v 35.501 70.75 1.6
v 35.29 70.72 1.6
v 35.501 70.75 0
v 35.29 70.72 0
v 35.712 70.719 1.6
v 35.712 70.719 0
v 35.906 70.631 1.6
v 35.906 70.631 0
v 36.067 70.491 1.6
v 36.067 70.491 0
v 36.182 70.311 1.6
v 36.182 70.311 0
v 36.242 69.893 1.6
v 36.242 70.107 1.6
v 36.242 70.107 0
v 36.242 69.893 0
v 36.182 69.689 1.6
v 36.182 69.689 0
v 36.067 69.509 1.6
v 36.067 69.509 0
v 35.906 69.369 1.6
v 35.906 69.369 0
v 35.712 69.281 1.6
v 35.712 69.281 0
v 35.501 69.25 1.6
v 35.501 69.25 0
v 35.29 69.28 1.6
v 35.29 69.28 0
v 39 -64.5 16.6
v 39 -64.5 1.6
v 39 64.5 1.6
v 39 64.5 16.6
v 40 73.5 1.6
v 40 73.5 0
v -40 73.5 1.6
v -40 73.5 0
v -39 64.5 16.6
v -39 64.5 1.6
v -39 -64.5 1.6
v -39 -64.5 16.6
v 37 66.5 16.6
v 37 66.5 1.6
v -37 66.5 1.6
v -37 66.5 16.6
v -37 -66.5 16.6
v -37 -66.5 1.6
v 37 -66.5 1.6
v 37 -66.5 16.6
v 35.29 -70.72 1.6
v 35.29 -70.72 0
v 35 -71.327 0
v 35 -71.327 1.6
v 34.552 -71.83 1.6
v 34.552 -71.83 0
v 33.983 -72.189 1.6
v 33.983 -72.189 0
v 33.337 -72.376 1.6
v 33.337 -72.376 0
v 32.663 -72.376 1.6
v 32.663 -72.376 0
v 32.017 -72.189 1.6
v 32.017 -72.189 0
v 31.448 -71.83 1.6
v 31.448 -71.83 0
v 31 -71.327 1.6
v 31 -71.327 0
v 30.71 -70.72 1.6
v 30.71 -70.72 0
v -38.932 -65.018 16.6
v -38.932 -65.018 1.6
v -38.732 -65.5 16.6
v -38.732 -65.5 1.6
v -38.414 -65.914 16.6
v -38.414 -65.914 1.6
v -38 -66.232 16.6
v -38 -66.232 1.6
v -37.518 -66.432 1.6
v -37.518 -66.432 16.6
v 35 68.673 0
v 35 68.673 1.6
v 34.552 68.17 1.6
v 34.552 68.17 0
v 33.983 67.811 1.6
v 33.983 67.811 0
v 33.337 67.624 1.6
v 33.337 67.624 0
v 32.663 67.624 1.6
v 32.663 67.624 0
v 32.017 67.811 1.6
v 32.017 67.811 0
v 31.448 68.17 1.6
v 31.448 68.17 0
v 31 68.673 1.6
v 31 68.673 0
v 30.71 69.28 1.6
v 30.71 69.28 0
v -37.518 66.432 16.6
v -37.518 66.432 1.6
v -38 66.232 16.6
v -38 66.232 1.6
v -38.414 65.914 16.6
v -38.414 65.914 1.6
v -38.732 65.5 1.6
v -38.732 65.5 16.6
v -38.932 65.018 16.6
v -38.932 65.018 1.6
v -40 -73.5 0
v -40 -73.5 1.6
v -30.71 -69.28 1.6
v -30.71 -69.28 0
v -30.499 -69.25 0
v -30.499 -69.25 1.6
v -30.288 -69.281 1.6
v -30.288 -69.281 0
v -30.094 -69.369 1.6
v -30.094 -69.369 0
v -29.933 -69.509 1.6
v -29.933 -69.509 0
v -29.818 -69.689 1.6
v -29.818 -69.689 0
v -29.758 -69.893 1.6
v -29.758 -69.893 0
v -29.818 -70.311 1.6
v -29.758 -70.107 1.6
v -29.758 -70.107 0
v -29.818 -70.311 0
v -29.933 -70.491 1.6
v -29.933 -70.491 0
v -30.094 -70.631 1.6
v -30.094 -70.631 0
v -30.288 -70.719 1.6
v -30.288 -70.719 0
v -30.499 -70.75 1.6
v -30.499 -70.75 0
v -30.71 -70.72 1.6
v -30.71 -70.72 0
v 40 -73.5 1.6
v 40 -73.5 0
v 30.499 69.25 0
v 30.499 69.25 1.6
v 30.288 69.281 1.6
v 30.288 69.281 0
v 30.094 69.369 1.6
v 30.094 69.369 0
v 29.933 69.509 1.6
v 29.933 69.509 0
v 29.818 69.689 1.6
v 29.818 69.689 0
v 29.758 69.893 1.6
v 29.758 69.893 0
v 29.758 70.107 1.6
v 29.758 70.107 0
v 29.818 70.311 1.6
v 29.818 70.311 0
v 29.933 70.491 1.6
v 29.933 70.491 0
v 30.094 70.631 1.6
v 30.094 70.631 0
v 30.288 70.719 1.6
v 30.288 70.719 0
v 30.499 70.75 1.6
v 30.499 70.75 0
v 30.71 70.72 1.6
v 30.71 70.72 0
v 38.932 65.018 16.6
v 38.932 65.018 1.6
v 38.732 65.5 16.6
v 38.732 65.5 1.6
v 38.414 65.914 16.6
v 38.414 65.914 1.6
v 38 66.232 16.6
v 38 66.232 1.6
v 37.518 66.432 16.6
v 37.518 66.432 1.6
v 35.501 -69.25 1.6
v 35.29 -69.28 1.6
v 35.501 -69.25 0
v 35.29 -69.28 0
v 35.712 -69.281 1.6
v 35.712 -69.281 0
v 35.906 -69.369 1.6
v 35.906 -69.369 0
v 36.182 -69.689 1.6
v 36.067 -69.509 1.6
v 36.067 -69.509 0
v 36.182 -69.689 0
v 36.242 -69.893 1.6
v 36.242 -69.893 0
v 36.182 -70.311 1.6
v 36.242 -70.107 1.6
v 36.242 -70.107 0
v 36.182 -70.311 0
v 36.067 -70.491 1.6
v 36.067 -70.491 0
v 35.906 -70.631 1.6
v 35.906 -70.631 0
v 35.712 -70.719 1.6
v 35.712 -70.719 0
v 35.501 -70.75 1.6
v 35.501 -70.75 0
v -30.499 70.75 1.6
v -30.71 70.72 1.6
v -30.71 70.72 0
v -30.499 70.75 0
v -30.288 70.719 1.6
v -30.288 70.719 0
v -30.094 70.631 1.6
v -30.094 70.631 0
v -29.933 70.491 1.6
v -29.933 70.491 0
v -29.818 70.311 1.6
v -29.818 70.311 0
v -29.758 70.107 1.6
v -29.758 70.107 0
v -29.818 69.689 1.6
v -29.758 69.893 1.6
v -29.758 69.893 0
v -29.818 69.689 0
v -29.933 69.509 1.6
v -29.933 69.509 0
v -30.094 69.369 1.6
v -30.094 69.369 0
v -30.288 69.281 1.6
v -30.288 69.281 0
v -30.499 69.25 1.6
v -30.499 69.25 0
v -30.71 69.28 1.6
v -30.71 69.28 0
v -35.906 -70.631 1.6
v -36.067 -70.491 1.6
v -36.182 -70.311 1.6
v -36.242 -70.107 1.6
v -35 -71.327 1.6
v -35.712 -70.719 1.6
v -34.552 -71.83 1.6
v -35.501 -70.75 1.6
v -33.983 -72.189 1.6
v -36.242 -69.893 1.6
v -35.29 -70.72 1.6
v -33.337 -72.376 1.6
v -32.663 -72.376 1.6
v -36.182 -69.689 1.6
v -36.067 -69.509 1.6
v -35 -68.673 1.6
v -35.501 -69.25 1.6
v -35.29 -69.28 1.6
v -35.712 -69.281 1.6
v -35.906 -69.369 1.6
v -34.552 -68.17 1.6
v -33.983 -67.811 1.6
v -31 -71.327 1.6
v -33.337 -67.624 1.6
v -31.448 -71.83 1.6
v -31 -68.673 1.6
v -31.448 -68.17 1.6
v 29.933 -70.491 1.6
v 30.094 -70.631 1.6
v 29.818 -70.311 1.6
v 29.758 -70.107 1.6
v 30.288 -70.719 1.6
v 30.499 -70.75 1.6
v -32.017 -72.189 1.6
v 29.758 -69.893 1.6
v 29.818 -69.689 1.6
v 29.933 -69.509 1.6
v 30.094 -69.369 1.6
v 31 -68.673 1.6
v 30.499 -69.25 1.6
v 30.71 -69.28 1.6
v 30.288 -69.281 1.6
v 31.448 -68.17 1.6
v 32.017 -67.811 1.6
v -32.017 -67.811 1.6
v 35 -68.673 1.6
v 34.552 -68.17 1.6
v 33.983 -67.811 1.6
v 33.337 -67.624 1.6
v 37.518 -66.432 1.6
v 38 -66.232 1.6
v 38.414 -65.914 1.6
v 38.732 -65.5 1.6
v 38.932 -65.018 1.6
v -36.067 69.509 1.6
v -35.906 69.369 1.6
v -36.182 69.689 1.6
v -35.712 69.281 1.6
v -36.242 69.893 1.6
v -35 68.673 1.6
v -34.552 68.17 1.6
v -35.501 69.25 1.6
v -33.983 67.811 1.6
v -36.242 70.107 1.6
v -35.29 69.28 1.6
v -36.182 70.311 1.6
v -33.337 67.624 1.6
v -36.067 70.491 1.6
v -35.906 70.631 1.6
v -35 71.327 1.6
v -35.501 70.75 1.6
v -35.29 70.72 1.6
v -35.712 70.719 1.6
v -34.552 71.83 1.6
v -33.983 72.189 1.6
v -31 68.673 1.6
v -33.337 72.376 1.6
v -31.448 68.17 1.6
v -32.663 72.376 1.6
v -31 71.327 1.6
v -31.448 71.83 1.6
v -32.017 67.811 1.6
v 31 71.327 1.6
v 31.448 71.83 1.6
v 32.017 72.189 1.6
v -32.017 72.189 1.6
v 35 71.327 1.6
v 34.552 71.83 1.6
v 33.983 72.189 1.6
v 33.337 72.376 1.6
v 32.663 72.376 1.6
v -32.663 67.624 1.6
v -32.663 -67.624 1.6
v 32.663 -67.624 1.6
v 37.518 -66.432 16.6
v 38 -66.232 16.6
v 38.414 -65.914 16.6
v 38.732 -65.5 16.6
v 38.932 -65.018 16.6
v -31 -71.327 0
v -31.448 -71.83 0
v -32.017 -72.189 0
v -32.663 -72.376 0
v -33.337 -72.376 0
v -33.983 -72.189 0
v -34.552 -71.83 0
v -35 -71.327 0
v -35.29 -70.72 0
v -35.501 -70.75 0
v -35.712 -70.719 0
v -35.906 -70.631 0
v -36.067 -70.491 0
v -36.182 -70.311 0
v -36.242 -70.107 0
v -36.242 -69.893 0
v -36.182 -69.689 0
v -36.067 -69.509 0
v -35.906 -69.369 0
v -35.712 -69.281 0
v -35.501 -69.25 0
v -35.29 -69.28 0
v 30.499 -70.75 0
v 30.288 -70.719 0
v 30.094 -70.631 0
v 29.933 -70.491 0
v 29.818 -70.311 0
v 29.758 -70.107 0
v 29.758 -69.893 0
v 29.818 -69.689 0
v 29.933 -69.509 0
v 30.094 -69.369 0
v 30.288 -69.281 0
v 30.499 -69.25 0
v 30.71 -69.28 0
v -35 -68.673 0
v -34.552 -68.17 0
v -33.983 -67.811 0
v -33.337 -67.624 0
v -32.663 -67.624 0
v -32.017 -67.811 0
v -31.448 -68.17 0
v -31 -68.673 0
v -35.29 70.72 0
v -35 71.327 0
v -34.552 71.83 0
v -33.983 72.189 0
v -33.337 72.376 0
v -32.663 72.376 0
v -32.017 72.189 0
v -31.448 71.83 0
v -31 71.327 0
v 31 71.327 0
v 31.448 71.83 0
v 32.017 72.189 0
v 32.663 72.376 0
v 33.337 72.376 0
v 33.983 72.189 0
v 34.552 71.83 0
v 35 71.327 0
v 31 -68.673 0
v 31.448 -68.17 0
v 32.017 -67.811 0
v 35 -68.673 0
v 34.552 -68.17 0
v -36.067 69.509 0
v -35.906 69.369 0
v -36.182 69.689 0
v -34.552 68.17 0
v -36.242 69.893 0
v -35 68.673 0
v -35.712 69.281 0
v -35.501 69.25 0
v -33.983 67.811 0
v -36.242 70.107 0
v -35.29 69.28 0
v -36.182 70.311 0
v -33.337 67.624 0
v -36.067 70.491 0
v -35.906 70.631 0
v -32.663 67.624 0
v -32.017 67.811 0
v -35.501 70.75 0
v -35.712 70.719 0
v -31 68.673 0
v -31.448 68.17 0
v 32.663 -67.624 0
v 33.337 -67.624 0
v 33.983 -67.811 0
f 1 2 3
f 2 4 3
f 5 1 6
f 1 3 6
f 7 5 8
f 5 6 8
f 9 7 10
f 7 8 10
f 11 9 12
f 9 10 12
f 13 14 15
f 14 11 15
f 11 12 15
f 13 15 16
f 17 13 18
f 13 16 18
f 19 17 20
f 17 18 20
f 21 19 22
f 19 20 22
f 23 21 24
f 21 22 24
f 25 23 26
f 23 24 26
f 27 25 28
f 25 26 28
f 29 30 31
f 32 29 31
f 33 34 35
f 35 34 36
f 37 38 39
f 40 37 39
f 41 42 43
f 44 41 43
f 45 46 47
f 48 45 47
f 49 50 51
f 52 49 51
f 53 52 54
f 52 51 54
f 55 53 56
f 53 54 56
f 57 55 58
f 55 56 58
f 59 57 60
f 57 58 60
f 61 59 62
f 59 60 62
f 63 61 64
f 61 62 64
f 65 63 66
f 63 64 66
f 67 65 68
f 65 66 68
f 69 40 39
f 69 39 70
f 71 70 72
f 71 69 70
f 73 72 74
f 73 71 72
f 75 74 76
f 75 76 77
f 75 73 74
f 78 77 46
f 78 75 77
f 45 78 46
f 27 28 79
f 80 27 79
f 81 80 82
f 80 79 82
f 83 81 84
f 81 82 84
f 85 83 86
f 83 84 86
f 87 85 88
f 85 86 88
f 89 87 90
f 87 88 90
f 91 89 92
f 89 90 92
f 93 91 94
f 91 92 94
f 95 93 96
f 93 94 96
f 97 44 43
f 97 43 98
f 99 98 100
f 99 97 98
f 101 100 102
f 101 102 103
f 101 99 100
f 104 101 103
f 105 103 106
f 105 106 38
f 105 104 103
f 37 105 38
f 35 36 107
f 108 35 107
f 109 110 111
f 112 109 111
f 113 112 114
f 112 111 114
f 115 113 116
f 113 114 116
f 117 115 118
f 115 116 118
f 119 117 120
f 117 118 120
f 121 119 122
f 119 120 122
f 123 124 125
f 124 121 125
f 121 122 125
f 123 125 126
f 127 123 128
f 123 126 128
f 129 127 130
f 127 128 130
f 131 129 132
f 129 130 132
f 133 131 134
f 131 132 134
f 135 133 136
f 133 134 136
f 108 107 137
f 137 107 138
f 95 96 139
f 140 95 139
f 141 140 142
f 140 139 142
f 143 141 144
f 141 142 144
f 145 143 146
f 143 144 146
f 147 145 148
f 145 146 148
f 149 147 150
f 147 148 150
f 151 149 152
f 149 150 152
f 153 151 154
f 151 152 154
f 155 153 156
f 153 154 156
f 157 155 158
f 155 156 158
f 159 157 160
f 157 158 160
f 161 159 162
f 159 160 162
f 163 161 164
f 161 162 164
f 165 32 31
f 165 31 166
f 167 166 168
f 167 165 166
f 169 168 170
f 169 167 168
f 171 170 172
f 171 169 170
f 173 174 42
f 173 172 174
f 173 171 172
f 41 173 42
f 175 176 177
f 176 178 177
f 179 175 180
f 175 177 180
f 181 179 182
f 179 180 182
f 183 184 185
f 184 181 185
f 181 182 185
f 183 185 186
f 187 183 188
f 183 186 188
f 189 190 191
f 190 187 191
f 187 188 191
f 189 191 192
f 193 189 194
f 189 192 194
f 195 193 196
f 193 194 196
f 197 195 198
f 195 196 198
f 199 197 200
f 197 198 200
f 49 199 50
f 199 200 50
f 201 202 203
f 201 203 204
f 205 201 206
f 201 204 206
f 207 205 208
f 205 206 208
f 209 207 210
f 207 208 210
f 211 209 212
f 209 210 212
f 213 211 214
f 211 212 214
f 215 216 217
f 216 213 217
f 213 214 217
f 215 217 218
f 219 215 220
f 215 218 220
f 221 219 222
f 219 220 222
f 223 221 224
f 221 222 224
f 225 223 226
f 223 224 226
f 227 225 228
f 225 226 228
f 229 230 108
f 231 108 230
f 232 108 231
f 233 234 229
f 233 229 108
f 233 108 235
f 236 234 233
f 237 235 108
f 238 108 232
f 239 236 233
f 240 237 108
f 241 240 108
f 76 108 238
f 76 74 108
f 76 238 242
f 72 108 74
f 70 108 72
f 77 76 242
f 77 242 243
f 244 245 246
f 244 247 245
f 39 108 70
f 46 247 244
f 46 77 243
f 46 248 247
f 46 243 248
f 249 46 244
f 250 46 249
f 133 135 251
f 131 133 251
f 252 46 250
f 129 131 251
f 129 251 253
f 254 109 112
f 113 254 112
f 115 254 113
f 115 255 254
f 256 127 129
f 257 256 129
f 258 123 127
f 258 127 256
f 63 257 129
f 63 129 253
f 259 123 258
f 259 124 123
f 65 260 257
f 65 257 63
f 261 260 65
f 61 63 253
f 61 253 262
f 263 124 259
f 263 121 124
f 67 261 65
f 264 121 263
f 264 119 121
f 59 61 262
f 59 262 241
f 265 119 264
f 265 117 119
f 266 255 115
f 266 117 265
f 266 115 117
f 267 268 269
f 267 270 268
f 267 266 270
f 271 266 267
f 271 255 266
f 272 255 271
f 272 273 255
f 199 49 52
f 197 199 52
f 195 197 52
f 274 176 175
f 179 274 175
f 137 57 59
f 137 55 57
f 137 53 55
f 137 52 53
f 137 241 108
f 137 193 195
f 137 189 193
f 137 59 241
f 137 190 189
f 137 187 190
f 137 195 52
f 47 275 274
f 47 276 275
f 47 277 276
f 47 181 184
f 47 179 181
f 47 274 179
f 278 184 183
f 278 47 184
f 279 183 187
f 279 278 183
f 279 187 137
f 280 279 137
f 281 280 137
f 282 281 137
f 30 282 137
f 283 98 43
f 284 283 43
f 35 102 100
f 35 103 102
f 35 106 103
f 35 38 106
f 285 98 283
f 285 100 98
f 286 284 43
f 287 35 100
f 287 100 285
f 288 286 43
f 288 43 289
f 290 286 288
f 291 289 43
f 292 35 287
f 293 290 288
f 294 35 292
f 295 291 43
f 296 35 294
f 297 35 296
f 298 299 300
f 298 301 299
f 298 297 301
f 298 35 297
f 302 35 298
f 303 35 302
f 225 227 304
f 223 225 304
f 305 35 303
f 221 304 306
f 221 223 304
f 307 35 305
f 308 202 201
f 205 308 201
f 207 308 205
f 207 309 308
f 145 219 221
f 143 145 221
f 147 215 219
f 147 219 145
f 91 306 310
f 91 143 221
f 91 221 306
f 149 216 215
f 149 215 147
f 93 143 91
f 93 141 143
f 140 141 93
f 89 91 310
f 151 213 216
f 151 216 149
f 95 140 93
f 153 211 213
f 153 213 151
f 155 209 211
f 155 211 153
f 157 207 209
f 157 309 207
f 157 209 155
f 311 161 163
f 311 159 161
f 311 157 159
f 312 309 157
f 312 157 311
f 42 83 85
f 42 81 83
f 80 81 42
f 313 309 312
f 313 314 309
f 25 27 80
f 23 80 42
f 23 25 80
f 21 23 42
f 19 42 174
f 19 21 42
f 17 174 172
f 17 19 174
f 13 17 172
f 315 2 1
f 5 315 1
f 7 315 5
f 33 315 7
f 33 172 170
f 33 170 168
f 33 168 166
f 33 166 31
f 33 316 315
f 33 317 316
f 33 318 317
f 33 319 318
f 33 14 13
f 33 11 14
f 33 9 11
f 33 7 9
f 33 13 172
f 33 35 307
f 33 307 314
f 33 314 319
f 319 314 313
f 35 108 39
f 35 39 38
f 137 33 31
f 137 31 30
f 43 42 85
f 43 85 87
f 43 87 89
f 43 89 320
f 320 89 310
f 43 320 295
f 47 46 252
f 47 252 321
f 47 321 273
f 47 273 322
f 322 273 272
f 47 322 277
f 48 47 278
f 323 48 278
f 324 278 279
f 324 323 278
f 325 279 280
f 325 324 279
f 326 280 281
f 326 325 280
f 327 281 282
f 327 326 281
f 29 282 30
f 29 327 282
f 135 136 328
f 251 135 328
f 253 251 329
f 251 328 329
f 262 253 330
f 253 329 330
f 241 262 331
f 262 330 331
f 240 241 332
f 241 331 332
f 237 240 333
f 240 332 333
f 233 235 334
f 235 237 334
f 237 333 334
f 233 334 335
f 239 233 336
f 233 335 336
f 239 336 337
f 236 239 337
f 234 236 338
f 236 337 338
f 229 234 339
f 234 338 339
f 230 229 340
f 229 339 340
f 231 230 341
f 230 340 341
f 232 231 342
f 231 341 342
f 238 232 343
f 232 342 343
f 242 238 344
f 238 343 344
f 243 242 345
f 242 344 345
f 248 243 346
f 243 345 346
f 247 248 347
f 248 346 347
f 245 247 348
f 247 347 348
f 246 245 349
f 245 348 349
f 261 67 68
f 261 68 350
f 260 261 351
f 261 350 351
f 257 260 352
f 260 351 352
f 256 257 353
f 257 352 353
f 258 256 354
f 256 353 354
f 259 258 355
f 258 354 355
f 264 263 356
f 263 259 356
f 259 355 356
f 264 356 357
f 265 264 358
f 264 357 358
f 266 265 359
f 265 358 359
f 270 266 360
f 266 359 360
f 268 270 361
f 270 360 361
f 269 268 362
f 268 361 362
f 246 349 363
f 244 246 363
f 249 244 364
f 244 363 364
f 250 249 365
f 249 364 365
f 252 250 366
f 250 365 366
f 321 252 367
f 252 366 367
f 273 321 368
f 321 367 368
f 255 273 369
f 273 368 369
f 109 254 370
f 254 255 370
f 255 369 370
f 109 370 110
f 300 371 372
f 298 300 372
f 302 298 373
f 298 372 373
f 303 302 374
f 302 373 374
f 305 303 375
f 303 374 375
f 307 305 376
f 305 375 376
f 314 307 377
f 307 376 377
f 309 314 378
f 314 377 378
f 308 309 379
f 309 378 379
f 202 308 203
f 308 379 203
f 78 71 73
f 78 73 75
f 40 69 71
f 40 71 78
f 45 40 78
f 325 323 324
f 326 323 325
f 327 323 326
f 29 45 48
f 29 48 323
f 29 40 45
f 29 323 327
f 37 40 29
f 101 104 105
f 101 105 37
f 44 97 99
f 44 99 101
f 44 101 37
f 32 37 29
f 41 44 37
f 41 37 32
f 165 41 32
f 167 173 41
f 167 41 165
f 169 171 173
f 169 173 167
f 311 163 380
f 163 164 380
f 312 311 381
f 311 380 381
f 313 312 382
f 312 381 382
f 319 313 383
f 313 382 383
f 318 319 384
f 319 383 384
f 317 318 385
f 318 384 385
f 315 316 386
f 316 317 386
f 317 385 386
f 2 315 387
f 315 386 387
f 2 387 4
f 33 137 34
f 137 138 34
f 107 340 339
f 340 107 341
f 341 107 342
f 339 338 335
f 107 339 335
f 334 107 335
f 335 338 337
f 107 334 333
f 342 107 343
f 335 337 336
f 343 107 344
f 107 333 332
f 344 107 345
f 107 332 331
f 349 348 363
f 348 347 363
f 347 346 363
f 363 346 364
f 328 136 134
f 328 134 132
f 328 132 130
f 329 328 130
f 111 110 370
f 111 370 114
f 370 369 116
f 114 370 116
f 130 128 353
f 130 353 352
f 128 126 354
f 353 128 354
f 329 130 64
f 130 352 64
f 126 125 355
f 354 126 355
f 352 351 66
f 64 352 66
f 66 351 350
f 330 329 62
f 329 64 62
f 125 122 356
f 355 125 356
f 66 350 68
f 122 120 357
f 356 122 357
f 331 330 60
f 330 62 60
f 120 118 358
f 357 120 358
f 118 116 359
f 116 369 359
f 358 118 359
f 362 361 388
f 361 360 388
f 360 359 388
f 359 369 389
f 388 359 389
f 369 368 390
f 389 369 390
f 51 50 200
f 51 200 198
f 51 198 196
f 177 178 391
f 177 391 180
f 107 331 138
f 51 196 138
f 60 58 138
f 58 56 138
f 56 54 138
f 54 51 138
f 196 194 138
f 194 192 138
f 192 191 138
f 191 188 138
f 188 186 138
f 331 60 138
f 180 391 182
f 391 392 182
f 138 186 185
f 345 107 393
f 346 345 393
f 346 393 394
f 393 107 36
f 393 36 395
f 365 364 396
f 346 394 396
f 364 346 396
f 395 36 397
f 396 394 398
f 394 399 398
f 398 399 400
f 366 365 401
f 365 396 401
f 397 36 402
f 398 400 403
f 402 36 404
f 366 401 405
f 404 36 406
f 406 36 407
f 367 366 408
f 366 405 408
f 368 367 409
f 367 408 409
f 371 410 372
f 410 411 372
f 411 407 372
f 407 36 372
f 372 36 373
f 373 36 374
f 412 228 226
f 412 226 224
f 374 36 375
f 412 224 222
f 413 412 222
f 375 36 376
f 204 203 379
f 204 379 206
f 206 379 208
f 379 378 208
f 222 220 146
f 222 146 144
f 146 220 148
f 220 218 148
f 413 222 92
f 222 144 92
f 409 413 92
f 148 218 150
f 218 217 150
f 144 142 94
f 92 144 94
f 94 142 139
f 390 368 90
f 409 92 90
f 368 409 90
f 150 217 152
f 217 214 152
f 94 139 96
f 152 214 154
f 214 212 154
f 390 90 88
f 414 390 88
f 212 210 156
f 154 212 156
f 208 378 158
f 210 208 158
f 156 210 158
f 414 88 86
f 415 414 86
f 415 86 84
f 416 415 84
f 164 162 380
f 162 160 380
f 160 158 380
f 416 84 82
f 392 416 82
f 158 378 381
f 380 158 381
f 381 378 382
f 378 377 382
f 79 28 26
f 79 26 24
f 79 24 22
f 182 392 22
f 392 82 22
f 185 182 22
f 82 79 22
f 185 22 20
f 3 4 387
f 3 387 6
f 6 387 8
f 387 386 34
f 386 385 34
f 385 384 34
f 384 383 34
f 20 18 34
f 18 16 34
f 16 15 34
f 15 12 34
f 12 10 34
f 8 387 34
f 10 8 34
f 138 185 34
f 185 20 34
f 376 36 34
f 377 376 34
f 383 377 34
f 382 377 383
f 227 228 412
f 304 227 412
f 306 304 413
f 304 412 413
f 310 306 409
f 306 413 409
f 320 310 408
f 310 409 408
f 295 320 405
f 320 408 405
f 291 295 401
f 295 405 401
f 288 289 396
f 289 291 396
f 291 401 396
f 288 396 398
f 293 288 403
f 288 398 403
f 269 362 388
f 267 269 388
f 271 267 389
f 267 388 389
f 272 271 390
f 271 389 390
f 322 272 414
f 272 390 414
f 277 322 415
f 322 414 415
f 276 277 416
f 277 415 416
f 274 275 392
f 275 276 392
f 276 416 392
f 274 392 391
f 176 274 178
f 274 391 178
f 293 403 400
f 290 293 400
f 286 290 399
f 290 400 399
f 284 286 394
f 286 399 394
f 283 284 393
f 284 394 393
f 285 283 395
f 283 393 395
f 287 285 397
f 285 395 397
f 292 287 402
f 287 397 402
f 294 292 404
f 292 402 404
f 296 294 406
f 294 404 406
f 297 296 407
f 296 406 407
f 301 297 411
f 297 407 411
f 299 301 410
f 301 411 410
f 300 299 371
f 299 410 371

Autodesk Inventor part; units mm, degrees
ref_plane "YZ Plane" through (0, 0, 0) normal (1, 0, 0) x (0, 1, 0)
ref_plane "XZ Plane" through (0, 0, 0) normal (0, 1, 0) x (-1, 0, 0)
ref_plane "XY Plane" through (0, 0, 0) normal (0, 0, 1) x (1, 0, 0)
sketch "Sketch1" plane through (0, 0, 0) normal (0, 0, 1) x (1, 0, 0)
  line L0 (40, 73.5) -> (-40, 73.5)
  line L1 (-40, 73.5) -> (-40, -73.5)
  line L2 (-40, -73.5) -> (40, -73.5)
  line L3 (40, -73.5) -> (40, 73.5)
  line L4 (40, 73.5) -> (-40, -73.5) construction
  line L5 (-40, 73.5) -> (40, -73.5) construction
  line L6 (-33, 70) -> (33, 70) construction
  line L7 (33, 70) -> (33, -70) construction
  line L8 (33, -70) -> (-33, -70) construction
  line L9 (-33, -70) -> (-33, 70) construction
  line L10 (-33, 70) -> (33, -70) construction
  line L11 (33, 70) -> (-33, -70) construction
  line L12 (40, 0) -> (-40, 0) construction
  line L13 (0, 73.5) -> (0, -73.5) construction
  circle A0 centre (33, 70) radius 2.4
  circle A1 centre (-33, 70) radius 2.4
  circle A2 centre (33, -70) radius 2.4
  circle A3 centre (-33, -70) radius 2.4
  line L14 (33, 73.25) -> (33, 66.75) construction
  arc A4 (35.2895, 69.2801) -> (35.2895, 70.7199) centre (35.5, 70) ccw
  arc A5 (30.7105, 70.7199) -> (30.7105, 69.2801) centre (30.5, 70) ccw
  arc A6 (-35.2895, 70.7199) -> (-35.2895, 69.2801) centre (-35.5, 70) ccw
  arc A7 (-30.7105, 69.2801) -> (-30.7105, 70.7199) centre (-30.5, 70) ccw
  arc A8 (35.2895, -70.7199) -> (35.2895, -69.2801) centre (35.5, -70) ccw
  arc A9 (30.7105, -69.2801) -> (30.7105, -70.7199) centre (30.5, -70) ccw
  arc A10 (-35.2895, -69.2801) -> (-35.2895, -70.7199) centre (-35.5, -70) ccw
  arc A11 (-30.7105, -70.7199) -> (-30.7105, -69.2801) centre (-30.5, -70) ccw
  line L15 (39, 66.5) -> (-39, 66.5)
  line L16 (-39, 66.5) -> (-39, -66.5)
  line L17 (-39, -66.5) -> (39, -66.5)
  line L18 (39, -66.5) -> (39, 66.5)
  line L19 (39, 66.5) -> (-39, -66.5) construction
  line L20 (-39, 66.5) -> (39, -66.5) construction
  point P0 (0, 0)
  point P1 (36.25, 70)
  point P2 (29.75, 70)
  point P3 (36.25, -70)
  point P4 (30.7105, 69.2801)
  point P5 (30.7105, 70.7199)
  point P6 (-30.7105, 70.7199)
  point P7 (-30.7105, 69.2801)
  point P8 (-35.2895, 69.2801)
  point P9 (-35.2895, 70.7199)
  point P10 (-30.7105, -69.2801)
  point P11 (-30.7105, -70.7199)
  point P12 (-35.2895, -70.7199)
  point P13 (-35.2895, -69.2801)
  point P14 (35.2895, -69.2801)
  point P15 (35.2895, -70.7199)
  point P16 (30.7105, -70.7199)
  point P17 (30.7105, -69.2801)
  dimension "d0" = 80
  dimension "d1" = 147
  dimension "d19" = 4.8
  dimension "d30" = 6.5
  dimension "d33" = 140
  dimension "d34" = 66
  dimension "d35" = 6.5
  dimension "d36" = 1.5
  dimension "d37" = 7
  dimension "d38" = 1
  dimension "d39" = 133
  dimension "d40" = 78
  dimension "d41" = 14
extrude "Extrusion1" add sketch "Sketch1" along normal blind 1.6 contours L3 L2 L1 L0 | L18 L17 L16 L15
extrude "Extrusion2" add sketch "Sketch1" along normal blind 16.6 contours L18 L17 L16 L15
fillet "Fillet1" radius 2 4 edges at (39, -66.5, 9.1) (39, 66.5, 9.1) (-39, -66.5, 9.1) (-39, 66.5, 9.1)
properties part number "SUSTAINA-POWER-MONITOR-BOARD" material "Acetal Resin, Black"
